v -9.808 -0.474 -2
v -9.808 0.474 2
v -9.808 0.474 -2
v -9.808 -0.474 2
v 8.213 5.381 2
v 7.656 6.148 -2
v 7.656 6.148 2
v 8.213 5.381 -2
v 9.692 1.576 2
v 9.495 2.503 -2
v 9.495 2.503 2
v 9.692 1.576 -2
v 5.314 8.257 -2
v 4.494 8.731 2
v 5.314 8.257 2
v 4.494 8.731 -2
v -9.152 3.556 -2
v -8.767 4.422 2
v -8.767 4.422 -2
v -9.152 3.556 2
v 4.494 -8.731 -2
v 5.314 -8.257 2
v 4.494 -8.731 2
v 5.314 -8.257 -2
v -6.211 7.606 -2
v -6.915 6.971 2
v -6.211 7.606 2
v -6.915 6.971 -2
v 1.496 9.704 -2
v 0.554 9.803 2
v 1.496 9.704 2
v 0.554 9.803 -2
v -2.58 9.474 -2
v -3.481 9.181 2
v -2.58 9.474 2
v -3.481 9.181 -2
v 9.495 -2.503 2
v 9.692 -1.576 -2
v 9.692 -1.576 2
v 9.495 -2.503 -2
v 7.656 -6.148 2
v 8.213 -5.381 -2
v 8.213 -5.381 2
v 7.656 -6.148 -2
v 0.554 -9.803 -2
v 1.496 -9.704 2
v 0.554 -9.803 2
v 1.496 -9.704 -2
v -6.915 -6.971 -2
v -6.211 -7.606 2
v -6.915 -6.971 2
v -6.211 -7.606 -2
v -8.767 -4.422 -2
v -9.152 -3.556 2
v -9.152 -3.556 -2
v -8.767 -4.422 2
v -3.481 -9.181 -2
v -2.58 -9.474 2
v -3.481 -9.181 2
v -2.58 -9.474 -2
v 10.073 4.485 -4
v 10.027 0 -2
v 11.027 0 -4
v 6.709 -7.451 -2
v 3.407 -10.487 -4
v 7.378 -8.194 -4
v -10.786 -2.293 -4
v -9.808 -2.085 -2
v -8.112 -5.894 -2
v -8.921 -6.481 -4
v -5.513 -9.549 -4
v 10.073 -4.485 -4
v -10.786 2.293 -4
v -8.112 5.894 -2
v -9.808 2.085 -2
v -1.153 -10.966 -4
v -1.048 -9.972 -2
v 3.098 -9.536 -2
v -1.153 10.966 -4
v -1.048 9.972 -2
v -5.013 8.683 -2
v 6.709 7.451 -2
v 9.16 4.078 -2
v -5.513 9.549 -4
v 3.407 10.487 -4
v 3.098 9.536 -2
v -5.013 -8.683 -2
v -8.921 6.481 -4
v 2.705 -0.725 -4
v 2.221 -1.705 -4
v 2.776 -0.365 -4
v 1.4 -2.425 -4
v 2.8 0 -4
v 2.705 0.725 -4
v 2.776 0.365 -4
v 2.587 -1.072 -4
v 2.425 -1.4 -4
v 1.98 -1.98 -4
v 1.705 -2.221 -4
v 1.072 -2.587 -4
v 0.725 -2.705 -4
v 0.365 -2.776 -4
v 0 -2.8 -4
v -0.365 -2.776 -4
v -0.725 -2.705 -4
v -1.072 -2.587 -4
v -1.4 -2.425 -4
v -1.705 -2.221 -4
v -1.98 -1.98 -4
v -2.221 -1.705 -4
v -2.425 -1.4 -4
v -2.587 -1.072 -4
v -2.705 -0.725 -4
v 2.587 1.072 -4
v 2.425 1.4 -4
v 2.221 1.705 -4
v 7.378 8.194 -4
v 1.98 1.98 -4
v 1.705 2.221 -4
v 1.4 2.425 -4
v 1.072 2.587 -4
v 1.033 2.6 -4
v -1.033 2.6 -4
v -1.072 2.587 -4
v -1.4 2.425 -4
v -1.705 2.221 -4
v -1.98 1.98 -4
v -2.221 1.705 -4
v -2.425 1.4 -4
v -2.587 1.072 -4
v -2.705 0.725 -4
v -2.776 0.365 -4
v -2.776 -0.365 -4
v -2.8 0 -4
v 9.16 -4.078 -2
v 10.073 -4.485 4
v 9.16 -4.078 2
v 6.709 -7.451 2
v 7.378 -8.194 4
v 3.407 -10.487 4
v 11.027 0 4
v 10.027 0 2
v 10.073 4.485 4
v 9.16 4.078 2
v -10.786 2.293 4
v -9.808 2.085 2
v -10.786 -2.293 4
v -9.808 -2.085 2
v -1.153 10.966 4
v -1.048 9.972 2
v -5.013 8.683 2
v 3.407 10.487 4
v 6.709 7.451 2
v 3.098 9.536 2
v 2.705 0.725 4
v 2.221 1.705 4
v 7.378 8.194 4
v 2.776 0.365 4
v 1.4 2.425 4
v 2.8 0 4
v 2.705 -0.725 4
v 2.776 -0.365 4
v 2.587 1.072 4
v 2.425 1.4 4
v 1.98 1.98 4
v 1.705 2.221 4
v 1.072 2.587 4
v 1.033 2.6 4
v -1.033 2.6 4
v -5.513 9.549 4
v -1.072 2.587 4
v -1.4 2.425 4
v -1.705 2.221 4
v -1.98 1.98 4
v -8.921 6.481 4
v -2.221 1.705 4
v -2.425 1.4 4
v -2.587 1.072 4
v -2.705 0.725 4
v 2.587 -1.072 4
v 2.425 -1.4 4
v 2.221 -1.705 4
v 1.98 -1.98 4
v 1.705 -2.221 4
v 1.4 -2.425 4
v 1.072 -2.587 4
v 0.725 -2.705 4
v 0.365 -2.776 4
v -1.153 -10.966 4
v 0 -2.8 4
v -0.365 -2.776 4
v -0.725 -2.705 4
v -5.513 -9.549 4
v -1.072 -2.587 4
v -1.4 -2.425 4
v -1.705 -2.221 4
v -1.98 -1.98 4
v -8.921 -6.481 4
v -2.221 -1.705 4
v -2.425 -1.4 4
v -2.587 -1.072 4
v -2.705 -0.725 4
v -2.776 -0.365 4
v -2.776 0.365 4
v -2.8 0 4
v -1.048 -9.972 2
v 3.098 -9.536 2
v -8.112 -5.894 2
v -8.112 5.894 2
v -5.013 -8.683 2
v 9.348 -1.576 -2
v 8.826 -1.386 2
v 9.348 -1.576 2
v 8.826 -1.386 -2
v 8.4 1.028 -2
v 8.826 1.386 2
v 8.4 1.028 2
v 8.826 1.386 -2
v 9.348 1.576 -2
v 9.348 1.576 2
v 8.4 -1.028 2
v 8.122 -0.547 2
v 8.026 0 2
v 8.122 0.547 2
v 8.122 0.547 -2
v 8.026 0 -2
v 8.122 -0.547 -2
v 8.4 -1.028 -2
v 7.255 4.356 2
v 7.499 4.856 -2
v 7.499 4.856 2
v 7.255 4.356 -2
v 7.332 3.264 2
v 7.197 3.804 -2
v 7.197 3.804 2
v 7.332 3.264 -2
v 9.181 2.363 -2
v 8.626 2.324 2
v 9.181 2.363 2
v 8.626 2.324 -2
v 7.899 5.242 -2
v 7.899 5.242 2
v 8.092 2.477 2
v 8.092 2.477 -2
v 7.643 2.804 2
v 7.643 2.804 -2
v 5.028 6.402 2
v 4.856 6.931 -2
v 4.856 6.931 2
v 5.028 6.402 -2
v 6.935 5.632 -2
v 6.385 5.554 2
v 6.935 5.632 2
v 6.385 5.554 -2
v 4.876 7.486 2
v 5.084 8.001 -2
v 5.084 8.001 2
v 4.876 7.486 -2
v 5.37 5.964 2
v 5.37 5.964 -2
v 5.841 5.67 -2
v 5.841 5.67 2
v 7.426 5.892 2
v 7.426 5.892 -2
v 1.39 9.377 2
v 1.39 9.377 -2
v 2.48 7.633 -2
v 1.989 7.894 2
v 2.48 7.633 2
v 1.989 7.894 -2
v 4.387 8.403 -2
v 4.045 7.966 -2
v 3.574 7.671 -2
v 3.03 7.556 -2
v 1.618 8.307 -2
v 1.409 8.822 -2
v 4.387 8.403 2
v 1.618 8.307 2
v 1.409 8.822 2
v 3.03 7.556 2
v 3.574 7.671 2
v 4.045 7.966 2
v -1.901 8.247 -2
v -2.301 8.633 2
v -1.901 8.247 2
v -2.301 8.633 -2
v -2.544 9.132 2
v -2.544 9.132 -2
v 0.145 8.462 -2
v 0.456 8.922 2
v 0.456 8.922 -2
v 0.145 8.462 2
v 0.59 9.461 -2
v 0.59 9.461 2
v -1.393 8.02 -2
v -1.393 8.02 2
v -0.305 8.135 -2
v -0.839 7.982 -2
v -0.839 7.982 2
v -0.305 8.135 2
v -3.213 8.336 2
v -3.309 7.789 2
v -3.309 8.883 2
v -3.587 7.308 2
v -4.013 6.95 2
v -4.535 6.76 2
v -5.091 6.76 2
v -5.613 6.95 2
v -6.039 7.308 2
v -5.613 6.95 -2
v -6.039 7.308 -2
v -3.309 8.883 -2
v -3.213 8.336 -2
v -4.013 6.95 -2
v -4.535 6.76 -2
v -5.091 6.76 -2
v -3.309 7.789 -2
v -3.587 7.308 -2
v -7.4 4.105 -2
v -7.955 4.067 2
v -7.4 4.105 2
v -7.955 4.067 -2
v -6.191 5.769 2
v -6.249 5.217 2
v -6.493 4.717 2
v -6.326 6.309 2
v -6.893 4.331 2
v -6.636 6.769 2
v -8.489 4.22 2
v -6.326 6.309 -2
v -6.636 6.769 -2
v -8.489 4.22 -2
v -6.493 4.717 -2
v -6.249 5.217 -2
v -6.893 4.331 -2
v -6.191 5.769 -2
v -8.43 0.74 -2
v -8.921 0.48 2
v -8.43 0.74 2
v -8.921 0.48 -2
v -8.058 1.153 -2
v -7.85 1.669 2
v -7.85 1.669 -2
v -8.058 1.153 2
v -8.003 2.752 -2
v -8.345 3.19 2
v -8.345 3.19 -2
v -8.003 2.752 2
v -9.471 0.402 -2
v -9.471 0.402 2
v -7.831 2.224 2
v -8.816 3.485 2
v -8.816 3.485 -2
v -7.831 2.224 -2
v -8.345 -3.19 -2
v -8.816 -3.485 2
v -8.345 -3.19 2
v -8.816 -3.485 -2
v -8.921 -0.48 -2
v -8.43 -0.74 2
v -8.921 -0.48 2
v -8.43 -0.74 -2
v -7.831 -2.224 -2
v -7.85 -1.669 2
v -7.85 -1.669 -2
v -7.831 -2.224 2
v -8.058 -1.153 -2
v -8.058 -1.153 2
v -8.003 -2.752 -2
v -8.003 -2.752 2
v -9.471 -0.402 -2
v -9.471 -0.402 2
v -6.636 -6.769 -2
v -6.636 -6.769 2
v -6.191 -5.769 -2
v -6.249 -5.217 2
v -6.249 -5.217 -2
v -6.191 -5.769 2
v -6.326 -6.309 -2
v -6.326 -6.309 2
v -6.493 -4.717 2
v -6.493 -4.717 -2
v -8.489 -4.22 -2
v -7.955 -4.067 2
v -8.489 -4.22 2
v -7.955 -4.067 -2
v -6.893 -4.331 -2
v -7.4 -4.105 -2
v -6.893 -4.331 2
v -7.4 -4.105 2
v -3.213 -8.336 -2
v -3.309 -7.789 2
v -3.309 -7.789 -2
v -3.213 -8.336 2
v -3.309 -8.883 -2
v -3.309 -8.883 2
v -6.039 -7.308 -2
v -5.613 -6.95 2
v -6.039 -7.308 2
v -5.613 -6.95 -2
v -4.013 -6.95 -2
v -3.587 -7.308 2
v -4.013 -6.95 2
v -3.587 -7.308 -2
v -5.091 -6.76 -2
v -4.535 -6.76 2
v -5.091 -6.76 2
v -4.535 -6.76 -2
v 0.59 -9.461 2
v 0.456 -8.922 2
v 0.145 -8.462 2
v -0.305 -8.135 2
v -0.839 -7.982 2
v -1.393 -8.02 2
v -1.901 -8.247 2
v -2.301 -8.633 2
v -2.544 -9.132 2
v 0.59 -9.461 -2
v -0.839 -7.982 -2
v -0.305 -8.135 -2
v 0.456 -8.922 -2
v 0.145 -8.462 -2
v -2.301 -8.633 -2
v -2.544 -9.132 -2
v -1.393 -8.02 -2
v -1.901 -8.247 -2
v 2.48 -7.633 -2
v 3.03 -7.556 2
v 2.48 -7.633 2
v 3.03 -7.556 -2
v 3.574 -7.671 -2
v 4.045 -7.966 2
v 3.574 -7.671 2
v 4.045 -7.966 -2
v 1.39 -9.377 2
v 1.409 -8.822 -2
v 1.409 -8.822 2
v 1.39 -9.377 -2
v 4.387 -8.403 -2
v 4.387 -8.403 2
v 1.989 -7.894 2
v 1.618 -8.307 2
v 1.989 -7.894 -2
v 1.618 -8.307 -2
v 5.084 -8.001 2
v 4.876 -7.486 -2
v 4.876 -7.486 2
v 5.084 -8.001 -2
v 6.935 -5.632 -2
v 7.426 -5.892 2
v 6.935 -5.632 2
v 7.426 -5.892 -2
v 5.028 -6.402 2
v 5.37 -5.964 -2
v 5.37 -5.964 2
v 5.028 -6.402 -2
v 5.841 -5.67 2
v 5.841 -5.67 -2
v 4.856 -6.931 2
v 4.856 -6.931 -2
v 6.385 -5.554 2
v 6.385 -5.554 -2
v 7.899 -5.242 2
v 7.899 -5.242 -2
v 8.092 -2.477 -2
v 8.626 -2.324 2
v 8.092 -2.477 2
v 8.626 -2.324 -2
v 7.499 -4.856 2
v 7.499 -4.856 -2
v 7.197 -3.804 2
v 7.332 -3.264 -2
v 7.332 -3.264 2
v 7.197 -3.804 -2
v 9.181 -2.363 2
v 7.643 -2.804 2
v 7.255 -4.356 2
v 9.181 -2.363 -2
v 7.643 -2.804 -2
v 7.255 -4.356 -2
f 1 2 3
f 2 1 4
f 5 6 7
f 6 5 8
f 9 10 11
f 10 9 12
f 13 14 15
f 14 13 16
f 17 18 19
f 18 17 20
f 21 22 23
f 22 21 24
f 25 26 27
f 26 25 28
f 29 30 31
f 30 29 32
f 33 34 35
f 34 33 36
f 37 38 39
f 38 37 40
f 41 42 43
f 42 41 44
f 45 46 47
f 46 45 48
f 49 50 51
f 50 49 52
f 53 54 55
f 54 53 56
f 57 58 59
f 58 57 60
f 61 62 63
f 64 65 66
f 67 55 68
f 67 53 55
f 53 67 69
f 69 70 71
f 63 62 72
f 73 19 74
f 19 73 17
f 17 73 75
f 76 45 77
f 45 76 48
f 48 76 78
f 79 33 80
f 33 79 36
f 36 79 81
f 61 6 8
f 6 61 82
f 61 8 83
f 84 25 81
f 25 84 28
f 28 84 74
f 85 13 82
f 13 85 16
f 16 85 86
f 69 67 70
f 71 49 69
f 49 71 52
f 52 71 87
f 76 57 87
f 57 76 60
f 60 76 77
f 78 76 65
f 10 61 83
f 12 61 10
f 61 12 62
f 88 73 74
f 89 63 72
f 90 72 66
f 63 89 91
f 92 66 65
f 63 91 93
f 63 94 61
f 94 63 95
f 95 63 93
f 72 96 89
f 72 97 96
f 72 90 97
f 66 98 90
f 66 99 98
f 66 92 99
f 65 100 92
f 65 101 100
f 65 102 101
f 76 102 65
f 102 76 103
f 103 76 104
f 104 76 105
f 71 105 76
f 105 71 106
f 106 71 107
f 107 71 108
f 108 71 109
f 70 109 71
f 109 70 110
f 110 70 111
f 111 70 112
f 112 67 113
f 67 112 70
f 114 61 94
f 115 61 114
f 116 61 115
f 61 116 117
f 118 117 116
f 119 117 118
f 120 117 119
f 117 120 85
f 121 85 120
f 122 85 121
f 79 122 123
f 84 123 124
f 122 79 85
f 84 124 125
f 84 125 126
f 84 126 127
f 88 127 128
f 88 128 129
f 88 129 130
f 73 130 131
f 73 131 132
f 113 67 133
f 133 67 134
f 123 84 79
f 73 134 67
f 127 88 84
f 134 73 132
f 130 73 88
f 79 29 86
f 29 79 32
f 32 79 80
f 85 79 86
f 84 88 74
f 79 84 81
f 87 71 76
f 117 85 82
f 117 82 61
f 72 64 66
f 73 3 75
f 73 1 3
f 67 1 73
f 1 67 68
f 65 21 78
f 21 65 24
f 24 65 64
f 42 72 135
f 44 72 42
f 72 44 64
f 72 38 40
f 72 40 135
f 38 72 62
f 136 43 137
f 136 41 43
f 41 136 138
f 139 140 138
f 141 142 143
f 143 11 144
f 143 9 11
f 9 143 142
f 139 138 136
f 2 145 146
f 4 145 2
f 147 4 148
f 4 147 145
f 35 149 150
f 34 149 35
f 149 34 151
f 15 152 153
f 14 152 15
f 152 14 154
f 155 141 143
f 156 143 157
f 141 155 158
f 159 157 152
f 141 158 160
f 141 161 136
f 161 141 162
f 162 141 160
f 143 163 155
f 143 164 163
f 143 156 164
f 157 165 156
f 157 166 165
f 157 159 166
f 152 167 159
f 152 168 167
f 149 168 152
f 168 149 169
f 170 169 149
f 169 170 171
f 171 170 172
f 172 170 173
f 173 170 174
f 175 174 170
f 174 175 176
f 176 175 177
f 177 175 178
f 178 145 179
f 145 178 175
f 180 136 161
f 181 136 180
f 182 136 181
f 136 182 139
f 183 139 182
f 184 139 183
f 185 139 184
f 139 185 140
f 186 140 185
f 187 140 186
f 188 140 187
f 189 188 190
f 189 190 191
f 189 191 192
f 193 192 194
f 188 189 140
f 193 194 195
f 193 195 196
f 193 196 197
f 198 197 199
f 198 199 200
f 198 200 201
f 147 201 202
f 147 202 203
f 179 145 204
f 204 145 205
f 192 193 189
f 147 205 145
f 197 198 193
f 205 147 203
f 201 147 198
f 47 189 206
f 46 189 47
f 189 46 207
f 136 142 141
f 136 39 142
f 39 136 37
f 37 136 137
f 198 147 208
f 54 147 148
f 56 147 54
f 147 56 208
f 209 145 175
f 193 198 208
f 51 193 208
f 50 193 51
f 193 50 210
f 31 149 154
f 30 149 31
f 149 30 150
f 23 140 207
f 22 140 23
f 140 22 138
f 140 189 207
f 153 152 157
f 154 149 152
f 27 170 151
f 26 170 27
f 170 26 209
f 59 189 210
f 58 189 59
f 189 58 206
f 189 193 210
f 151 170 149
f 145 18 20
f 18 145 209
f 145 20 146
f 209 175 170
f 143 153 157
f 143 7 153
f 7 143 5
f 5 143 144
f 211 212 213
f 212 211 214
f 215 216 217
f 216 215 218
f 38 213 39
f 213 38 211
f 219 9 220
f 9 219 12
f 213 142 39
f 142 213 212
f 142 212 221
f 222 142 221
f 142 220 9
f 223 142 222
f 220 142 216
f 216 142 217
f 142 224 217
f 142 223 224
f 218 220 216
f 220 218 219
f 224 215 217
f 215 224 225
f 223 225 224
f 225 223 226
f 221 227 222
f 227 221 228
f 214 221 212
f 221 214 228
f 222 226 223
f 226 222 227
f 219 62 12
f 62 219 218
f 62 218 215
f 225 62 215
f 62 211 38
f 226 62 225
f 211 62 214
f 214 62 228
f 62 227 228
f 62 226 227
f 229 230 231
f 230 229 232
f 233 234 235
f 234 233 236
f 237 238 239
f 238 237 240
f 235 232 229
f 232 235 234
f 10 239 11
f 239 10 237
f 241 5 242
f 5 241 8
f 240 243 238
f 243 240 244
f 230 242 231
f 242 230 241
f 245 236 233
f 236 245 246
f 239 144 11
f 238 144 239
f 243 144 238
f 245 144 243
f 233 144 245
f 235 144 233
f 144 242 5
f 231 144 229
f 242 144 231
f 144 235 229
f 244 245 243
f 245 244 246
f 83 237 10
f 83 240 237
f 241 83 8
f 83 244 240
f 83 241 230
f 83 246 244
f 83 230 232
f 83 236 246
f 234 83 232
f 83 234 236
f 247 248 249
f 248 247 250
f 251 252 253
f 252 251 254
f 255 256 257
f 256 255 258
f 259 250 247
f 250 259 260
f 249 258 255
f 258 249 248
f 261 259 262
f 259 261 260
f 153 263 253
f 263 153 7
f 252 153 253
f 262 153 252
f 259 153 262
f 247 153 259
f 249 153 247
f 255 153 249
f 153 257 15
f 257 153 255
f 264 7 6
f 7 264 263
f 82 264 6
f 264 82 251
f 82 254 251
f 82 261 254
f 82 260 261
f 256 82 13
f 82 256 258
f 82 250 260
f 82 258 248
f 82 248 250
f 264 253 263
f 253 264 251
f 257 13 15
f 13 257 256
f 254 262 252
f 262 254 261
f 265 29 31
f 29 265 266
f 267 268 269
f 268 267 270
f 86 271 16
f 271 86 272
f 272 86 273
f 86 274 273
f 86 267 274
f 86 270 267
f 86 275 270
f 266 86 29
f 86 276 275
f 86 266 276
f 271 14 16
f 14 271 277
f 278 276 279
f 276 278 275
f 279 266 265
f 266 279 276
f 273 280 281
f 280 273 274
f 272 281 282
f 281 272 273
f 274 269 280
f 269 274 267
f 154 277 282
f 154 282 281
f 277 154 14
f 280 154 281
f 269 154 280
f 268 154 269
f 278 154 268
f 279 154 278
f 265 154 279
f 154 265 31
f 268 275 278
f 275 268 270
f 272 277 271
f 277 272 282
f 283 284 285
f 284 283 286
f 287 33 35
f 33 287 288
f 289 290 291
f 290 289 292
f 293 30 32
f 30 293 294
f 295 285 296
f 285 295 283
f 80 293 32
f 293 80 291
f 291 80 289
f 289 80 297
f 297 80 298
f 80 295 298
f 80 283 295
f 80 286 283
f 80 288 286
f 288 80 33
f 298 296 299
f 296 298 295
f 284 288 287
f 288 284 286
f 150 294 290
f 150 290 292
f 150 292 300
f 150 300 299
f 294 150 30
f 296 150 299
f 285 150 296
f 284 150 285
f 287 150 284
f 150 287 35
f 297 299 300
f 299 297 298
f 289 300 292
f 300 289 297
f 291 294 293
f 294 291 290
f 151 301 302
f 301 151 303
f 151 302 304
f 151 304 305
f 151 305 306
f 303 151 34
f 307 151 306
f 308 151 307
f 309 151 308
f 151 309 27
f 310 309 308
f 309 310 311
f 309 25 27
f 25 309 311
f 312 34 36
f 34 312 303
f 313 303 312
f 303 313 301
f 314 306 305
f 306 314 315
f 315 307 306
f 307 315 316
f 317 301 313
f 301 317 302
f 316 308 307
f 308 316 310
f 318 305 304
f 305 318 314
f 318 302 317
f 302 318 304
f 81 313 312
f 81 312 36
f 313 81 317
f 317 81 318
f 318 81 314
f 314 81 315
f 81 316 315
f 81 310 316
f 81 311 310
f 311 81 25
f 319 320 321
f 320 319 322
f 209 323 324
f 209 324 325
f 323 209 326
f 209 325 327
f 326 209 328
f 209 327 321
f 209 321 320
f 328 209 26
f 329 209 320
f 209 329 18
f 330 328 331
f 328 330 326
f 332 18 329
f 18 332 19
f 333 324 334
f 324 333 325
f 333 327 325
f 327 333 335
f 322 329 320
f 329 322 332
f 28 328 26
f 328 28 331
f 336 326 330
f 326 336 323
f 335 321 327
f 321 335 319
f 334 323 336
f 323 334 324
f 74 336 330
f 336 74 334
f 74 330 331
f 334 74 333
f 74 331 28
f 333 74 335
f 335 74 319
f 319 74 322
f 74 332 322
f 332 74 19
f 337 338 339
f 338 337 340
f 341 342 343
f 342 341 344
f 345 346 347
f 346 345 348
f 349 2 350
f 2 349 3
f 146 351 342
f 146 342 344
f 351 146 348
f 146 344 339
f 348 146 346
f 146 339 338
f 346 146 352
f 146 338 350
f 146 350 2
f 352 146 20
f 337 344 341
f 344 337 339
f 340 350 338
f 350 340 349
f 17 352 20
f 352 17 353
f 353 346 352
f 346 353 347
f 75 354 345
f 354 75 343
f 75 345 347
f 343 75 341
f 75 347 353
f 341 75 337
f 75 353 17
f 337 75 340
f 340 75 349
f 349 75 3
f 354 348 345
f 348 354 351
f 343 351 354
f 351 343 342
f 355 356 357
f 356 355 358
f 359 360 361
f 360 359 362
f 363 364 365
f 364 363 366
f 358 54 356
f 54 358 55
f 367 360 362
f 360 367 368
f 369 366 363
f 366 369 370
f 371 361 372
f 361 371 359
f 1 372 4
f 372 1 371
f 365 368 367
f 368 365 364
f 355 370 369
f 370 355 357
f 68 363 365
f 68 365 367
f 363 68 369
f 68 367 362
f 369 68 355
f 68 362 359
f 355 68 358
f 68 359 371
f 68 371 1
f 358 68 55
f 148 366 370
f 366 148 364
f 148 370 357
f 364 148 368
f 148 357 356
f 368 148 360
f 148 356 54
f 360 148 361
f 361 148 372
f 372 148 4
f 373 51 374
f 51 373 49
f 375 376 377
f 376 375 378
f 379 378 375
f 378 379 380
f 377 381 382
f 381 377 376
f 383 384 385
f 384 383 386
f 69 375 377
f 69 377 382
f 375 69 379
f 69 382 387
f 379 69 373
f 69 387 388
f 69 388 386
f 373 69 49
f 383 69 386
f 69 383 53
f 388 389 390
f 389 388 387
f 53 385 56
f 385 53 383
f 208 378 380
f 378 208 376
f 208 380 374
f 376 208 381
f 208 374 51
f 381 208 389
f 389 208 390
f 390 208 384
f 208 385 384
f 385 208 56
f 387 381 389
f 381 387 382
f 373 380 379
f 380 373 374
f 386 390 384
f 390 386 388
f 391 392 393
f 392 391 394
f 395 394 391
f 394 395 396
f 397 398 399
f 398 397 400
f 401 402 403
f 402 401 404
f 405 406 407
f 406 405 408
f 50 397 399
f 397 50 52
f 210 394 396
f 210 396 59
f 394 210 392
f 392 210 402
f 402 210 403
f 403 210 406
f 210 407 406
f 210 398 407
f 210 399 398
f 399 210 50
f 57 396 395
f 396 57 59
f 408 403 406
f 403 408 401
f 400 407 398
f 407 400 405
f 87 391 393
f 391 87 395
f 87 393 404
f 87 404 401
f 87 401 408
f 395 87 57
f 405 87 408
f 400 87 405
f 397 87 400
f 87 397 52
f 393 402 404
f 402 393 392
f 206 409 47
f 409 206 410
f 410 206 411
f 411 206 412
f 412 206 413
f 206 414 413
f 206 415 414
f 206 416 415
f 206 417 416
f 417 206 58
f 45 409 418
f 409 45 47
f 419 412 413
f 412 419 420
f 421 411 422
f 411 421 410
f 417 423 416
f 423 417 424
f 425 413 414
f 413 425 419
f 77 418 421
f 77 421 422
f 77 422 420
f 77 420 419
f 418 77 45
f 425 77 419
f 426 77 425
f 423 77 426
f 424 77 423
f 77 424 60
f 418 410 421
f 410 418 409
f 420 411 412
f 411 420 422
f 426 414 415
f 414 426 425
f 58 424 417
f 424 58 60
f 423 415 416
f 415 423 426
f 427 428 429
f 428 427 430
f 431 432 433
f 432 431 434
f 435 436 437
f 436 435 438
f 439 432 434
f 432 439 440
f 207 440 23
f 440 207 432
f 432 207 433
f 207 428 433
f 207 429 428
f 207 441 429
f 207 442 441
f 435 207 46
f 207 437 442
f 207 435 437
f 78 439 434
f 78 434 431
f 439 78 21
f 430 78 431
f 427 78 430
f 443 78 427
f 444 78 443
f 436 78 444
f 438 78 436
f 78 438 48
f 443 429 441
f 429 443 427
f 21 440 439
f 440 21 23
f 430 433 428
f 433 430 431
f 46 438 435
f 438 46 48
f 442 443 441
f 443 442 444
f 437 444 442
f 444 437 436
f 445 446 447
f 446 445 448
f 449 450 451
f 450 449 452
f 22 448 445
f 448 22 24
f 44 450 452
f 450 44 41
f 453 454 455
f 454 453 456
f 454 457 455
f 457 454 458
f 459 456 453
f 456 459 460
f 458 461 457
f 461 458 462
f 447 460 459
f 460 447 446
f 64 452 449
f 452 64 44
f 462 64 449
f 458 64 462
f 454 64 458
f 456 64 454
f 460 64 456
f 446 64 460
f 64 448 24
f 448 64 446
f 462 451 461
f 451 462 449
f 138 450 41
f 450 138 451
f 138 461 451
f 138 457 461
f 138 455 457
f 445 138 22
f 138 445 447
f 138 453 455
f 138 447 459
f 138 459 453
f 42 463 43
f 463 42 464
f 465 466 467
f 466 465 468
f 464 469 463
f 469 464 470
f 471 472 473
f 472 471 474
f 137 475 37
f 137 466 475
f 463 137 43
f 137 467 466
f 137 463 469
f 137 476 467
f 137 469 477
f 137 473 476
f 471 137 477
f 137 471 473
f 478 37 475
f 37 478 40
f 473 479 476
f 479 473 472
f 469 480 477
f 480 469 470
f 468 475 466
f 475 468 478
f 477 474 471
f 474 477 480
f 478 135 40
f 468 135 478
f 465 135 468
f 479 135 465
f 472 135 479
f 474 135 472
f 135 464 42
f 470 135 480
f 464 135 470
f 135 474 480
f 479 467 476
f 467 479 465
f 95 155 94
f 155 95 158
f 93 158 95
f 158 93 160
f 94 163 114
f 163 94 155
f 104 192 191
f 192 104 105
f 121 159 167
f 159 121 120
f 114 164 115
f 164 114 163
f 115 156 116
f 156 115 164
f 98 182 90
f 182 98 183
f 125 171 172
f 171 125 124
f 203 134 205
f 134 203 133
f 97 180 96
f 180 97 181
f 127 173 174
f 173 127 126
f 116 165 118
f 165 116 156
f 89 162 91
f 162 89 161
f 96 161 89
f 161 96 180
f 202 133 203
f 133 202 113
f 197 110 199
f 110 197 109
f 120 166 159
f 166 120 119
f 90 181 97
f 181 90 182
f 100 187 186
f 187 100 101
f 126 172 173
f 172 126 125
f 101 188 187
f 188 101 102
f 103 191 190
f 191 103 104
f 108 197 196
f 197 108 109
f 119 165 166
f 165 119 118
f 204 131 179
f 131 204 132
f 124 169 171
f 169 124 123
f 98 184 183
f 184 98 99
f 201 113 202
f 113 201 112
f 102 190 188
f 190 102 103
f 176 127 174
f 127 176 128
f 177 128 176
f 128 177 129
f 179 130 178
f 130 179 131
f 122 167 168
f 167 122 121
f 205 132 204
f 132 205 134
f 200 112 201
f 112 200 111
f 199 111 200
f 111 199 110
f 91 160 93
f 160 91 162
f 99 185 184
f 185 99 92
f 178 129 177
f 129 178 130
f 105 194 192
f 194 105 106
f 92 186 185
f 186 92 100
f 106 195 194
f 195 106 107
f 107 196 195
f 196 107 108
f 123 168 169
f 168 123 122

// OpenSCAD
ball_d = 3;
ball_spacing = 4.2;
balls = 15;
hole_w = 4;

axle_d = 5.6;
axle_flat = 0.2;

sprocket_rim_h = 2;
sprocket_rim_w = 2;
sprocket_w = hole_w;
sprocket_d = balls * ball_spacing/PI;

e = 0.002;
e2 = 2*e;

segments = balls * 1;

echo(hole_w);
echo(sprocket_d);
difference() {
    union() {
        cylinder(d=sprocket_d, 
                 h=sprocket_w,
                 center = true,
                 $fn = segments);
        translate([0,0,-sprocket_w/2 - sprocket_rim_w/2])
            cylinder(d1=sprocket_d + sprocket_rim_h, 
                     d2=sprocket_d, 
                     h = sprocket_rim_w,
                     center = true,
                     $fn = segments );
        translate([0,0,sprocket_w/2 + sprocket_rim_w/2])
            cylinder(d1=sprocket_d, 
                     d2=sprocket_d + sprocket_rim_h,  
                     h = sprocket_rim_w,
                     center = true,        
                     $fn = segments);
    }
        
    for( a = [0:360/balls:359] )
        rotate(a) 
            translate([0.96*sprocket_d/2,0,0]) 
                cylinder(d=ball_d + 0.2, 
                         h=hole_w,
                         center=true,
                         $fn=18);
    
    difference() {
        cylinder(d=axle_d, 
                h=2*sprocket_rim_w + sprocket_w + e2,
                center = true,
                $fn = 48);
        translate([-axle_d/2, axle_d/2 - axle_flat,-(2*sprocket_rim_w + sprocket_w + e2)/2])
            cube(size=[axle_d,axle_d,2*sprocket_rim_w + sprocket_w + e2]);
        }

}
